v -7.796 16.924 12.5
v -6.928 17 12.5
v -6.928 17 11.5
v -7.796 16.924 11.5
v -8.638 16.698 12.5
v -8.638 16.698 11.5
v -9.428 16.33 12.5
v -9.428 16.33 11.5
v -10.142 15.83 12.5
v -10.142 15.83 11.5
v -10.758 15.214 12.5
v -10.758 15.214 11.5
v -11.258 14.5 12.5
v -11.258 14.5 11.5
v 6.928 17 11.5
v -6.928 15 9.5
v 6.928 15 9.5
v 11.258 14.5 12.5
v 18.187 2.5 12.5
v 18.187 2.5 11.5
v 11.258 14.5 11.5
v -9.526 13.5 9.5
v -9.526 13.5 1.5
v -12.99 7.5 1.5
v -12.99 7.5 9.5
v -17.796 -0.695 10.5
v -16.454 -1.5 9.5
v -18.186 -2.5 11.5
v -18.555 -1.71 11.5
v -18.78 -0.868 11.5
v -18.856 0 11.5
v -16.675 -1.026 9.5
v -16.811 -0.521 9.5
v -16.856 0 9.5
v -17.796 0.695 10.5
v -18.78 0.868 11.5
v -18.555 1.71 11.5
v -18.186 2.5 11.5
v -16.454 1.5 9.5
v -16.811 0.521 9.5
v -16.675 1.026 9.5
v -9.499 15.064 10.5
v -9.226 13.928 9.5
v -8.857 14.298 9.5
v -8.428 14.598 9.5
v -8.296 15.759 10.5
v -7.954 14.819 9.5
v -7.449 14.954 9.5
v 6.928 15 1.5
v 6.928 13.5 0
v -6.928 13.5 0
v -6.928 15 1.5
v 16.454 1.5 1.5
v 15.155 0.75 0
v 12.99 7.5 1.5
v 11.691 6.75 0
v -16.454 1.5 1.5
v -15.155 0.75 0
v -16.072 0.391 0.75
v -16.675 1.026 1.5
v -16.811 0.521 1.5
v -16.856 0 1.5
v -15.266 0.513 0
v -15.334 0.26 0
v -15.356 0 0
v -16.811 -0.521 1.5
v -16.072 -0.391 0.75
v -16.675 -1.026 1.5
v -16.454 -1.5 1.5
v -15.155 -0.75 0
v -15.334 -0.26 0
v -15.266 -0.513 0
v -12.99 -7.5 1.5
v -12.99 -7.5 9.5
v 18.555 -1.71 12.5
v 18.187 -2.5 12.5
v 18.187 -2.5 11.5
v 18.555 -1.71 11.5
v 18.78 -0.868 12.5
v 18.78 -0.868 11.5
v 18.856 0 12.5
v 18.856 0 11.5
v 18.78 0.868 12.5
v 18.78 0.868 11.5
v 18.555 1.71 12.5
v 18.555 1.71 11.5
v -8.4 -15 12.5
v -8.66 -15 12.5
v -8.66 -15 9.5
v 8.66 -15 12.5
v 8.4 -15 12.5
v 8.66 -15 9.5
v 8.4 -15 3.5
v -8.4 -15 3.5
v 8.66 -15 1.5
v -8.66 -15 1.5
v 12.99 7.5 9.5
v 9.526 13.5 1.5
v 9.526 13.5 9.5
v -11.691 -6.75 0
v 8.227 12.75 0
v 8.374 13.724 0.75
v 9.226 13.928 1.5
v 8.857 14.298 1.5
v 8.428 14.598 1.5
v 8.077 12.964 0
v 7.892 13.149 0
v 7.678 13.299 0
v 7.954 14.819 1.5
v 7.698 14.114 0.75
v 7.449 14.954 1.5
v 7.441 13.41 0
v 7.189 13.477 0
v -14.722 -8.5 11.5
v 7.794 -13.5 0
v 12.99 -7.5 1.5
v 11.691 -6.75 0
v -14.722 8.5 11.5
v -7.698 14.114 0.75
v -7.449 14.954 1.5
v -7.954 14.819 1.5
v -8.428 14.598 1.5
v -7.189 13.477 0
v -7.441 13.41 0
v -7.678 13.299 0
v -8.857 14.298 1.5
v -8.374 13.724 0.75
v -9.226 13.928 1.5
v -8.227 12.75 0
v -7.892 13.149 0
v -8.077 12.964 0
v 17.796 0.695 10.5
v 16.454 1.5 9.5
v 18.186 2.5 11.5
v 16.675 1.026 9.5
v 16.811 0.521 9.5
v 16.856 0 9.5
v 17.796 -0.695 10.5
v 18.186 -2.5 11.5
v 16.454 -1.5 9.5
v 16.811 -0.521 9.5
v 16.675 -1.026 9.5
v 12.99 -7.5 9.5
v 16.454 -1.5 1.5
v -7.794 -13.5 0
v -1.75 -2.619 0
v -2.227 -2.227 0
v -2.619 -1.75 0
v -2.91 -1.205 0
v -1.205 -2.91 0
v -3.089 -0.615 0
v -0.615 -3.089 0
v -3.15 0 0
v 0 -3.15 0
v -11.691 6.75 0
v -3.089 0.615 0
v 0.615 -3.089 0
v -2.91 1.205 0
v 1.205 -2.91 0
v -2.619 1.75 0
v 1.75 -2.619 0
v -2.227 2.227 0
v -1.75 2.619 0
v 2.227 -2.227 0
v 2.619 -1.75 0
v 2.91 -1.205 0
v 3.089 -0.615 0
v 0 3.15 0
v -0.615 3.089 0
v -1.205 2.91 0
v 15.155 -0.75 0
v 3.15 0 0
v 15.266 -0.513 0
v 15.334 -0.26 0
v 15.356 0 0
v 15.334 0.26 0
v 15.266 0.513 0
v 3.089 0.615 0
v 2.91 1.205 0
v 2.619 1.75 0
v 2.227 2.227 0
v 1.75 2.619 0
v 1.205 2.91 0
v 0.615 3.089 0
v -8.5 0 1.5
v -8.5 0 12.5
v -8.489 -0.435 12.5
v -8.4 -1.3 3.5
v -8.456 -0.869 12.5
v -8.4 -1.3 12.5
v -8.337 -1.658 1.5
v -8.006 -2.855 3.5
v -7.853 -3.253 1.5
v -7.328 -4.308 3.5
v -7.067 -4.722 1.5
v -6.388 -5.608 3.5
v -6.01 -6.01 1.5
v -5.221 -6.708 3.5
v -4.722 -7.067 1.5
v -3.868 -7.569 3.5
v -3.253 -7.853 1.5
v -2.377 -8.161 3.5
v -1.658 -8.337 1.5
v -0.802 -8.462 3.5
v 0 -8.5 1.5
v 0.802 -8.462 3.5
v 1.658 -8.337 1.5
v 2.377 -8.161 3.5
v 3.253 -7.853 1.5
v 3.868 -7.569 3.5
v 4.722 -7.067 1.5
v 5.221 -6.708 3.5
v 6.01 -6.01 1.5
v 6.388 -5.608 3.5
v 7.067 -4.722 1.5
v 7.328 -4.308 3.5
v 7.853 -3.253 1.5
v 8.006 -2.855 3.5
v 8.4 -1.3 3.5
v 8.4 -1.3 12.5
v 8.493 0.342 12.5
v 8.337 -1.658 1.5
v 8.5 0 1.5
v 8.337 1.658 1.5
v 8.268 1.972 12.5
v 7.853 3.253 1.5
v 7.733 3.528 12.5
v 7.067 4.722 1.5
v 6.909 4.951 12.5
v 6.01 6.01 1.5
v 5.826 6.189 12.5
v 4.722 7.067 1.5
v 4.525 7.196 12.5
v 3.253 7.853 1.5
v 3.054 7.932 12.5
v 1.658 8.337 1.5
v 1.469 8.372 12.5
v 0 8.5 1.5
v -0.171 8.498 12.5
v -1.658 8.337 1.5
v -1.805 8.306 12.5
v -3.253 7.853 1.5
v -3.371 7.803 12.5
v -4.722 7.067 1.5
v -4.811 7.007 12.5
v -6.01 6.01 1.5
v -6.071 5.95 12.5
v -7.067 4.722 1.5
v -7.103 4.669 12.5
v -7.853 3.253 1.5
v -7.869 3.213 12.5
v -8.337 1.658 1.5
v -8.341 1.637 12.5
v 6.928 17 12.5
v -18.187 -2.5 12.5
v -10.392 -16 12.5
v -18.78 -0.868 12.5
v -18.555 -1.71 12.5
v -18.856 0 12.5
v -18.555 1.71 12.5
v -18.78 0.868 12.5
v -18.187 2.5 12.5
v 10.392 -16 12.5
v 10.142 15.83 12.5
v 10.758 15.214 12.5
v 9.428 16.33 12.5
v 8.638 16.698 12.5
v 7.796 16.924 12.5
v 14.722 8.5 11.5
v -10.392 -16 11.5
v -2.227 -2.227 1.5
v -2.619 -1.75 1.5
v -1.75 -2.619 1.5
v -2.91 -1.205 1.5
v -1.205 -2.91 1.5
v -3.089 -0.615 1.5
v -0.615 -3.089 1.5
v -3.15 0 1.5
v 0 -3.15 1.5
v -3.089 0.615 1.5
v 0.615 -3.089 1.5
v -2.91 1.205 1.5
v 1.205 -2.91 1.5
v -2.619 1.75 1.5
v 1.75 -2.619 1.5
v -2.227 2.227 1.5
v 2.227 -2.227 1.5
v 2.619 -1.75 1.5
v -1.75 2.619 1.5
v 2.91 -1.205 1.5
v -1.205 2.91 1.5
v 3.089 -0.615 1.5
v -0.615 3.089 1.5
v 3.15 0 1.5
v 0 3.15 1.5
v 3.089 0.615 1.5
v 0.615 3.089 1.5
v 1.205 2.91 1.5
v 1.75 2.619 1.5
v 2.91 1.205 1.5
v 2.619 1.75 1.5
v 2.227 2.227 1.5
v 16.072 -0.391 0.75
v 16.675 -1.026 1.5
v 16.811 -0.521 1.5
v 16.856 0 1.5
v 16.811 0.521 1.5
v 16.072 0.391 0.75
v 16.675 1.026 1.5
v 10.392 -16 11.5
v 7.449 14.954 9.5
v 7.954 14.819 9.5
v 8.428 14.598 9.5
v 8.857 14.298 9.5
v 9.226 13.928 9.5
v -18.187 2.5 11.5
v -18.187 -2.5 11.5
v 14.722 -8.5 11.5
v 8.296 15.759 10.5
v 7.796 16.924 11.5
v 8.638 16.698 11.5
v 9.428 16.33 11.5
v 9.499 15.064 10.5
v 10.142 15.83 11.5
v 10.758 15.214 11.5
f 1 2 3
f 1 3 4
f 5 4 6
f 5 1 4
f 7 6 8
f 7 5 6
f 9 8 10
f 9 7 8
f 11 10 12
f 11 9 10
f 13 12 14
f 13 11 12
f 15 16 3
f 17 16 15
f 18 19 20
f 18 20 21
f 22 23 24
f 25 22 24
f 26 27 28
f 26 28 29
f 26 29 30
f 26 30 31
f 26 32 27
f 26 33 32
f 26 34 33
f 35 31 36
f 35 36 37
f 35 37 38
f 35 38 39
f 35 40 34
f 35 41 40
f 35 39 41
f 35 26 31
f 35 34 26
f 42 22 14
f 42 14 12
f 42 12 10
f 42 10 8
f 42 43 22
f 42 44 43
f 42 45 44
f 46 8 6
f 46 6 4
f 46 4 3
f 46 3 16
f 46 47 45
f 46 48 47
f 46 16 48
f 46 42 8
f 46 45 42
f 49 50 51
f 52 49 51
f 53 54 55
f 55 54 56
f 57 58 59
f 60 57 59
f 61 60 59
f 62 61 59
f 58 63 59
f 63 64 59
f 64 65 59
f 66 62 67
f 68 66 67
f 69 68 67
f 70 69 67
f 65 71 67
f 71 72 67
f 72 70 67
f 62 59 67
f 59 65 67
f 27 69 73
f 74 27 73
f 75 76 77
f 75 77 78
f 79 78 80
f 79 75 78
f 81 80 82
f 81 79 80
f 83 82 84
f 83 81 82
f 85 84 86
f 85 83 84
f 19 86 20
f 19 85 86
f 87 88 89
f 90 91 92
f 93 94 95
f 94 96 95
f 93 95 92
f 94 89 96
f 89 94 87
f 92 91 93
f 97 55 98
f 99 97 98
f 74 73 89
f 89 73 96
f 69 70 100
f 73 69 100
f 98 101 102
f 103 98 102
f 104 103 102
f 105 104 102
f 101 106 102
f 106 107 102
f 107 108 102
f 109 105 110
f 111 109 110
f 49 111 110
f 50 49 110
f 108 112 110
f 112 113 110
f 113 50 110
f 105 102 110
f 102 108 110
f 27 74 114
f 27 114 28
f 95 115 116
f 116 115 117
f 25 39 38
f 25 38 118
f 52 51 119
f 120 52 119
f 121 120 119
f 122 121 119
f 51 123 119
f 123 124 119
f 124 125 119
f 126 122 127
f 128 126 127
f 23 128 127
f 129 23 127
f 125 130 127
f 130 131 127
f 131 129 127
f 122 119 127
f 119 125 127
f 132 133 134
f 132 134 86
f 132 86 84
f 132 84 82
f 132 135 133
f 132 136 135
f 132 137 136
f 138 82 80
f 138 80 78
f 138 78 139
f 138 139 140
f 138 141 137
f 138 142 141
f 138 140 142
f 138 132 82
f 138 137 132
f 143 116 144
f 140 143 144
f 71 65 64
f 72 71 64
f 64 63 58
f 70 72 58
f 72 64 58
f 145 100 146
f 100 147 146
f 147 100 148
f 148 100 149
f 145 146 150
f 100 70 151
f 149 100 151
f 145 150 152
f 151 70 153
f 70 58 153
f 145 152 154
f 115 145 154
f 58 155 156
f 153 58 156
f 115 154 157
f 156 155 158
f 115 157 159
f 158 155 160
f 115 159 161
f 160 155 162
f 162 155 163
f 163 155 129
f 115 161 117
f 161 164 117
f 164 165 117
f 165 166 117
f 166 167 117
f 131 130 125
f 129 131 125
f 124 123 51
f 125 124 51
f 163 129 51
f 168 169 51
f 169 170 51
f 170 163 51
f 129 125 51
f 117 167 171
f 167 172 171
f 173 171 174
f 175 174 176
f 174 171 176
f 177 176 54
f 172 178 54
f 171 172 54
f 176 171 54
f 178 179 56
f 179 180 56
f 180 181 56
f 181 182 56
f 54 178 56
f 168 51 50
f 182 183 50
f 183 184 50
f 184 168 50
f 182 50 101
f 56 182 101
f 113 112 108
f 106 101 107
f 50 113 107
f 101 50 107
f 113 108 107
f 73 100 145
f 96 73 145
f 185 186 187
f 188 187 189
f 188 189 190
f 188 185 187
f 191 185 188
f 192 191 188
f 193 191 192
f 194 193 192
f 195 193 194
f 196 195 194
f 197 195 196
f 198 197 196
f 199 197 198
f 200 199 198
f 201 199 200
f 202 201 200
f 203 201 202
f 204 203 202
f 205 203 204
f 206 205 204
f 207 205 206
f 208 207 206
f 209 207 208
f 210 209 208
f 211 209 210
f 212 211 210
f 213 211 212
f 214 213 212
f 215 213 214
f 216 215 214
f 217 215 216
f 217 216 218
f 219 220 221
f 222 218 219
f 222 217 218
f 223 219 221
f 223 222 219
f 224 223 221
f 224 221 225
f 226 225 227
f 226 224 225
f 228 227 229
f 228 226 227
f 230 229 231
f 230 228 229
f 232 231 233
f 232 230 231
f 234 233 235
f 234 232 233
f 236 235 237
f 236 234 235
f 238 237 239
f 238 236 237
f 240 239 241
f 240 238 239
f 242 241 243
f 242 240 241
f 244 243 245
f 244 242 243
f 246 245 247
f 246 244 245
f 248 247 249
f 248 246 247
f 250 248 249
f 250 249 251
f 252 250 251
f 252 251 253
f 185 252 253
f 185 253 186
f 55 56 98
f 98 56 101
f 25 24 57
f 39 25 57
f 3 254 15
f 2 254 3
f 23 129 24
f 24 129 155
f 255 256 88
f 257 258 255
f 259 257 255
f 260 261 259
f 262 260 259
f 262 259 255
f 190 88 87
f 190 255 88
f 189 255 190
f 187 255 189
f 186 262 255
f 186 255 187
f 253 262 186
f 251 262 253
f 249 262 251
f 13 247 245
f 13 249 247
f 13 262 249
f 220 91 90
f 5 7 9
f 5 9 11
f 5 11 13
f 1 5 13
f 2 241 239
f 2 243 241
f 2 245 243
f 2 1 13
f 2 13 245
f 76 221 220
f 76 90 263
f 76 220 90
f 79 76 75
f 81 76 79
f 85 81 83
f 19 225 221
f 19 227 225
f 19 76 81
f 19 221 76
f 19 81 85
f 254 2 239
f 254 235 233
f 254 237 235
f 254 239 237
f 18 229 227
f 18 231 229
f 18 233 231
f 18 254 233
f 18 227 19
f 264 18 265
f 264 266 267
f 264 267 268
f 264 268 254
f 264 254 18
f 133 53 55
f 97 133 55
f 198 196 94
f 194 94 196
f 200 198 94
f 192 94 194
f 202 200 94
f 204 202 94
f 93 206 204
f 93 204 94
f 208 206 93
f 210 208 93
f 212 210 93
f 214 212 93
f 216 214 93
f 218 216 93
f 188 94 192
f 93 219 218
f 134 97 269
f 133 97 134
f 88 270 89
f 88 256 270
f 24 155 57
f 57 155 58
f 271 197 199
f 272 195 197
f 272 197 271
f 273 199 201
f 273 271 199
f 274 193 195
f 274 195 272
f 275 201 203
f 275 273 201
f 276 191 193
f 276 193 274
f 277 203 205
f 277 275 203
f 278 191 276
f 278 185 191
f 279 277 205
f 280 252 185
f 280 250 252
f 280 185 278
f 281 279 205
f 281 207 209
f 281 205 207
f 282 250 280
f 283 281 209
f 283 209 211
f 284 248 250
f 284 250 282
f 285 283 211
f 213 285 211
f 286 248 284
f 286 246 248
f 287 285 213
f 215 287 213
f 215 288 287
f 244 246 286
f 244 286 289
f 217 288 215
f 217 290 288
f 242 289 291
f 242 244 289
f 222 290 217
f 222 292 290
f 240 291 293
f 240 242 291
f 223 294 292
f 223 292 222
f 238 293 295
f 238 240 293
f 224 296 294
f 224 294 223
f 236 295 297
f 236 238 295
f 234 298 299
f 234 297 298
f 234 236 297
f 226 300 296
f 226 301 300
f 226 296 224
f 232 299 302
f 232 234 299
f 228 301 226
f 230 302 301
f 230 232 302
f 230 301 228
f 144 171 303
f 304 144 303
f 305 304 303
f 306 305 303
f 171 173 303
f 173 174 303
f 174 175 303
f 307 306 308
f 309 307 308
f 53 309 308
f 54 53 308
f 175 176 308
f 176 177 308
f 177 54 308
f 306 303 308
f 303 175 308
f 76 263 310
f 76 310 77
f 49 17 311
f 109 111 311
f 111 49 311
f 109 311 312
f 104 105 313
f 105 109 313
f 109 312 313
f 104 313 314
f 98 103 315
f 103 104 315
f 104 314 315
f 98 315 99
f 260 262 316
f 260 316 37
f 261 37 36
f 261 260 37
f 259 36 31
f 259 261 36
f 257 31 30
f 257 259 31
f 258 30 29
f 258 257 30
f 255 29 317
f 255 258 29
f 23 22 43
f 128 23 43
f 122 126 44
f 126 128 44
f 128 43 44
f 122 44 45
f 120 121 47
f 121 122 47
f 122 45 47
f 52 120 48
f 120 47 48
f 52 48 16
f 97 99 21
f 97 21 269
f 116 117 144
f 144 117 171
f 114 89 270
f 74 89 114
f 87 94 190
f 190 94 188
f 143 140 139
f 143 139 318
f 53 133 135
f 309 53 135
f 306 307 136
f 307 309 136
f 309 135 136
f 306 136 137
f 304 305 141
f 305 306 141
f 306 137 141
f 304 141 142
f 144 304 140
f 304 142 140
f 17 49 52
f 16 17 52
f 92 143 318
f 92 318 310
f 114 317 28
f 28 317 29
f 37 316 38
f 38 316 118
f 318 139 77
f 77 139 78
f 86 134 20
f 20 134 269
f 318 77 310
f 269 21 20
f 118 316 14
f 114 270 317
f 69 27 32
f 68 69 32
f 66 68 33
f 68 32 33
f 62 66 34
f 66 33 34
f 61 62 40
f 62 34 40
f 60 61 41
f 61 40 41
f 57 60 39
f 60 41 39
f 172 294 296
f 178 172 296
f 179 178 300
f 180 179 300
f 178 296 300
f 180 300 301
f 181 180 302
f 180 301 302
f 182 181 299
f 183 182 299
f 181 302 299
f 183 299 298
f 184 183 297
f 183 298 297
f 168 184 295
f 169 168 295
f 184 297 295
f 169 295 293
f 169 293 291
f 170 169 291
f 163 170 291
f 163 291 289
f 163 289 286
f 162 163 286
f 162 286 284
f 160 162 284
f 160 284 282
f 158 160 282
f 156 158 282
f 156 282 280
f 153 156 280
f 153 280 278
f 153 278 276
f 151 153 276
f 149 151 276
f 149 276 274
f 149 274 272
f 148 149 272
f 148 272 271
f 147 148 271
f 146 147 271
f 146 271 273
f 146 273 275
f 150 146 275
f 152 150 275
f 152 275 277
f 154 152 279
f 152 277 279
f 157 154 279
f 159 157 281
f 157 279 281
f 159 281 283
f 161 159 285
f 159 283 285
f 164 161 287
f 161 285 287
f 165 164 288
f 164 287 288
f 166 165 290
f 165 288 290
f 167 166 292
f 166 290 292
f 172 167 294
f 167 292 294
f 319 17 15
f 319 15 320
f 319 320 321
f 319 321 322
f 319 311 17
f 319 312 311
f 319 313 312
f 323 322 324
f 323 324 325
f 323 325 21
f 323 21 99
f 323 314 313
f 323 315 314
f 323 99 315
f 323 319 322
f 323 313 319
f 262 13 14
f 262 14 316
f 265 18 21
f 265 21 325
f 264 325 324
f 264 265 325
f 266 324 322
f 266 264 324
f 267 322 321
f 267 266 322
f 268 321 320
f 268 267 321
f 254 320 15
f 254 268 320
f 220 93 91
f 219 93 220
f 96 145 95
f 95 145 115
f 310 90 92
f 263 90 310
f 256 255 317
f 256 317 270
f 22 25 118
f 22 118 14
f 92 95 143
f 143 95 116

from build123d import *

# Parameters (mm, degrees)
SKETCH1_R           = 8.5
BOSS_EXTRUDE1_DEPTH = 1.5
SKETCH1_4_R         = 15
SKETCH1_4_R_2       = 8.5
BOSS_EXTRUDE2_DEPTH = 12.5
CUT_EXTRUDE1_START  = 2
SKETCH2_W           = 16.8
SKETCH2_H           = 15
CUT_EXTRUDE1_DEPTH  = 24.416530054
FILLET1_R           = 3
SKETCH3_R           = 3.15
CUT_EXTRUDE2_DEPTH  = 26.102558411
FILLET3_SIZE        = 1.5
BOSS_EXTRUDE3_DEPTH = 1
CHAMFER1_SIZE       = 2


with BuildPart() as part:
    # Sketch1 → Boss-Extrude1 (new body)
    with BuildSketch(Plane.XY):
        Circle(SKETCH1_R)
    extrude(amount=BOSS_EXTRUDE1_DEPTH)

    # Sketch1<4> → Boss-Extrude2 (add)
    # profile 1 of 7: a face of its own
    with BuildSketch(Plane.XY):
        Circle(SKETCH1_4_R)
        with Locations(Location((0, 0, 0), (0, 0, 180))):
            Circle(SKETCH1_4_R_2, mode=Mode.SUBTRACT)
    # profile 2 of 7: a face of its own
    with BuildSketch(Plane.XY):
        with BuildLine():
            Line((12.990381063, 7.499999988), (8.660254038, 15))
            Line((8.660254038, 15), (-1.6e-08, 15))
            ThreePointArc((-1.6e-08, 15), (7.499999999, 12.990381058), (12.990381063, 7.499999988))
        make_face()
    # profile 3 of 7: a face of its own
    with BuildSketch(Plane.XY):
        with BuildLine():
            ThreePointArc((-12.99038099, 7.500000116), (-7.499999949, 12.990381086), (-1.6e-08, 15))
            Line((-1.6e-08, 15), (-8.660254038, 15))
            Line((-8.660254038, 15), (-12.99038099, 7.500000116))
        make_face()
    # profile 4 of 7: a face of its own
    with BuildSketch(Plane.XY):
        with BuildLine():
            ThreePointArc((-12.990380876, -7.500000313), (-15, -1.14e-07), (-12.99038099, 7.500000116))
            Line((-12.99038099, 7.500000116), (-17.320508076, 0))
            Line((-17.320508076, 0), (-12.990380876, -7.500000313))
        make_face()
    # profile 5 of 7: a face of its own
    with BuildSketch(Plane.XY):
        with BuildLine():
            Line((17.320508076, 0), (12.990381063, 7.499999988))
            ThreePointArc((12.990381063, 7.499999988), (14.488887396, 3.88228567), (15, 0))
            ThreePointArc((15, 0), (14.488887391, -3.88228569), (12.990381043, -7.500000024))
            Line((12.990381043, -7.500000024), (17.320508076, 0))
        make_face()
    # profile 6 of 7: a face of its own
    with BuildSketch(Plane.XY):
        with BuildLine():
            Line((8.660254038, -15), (12.990381043, -7.500000024))
            ThreePointArc((12.990381043, -7.500000024), (7.499999988, -12.990381064), (0, -15))
            Line((0, -15), (8.660254038, -15))
        make_face()
    # profile 7 of 7: a face of its own
    with BuildSketch(Plane.XY):
        with BuildLine():
            ThreePointArc((0, -15), (-7.499999843, -12.990381147), (-12.990380876, -7.500000313))
            Line((-12.990380876, -7.500000313), (-8.660254038, -15))
            Line((-8.660254038, -15), (0, -15))
        make_face()
    extrude(amount=BOSS_EXTRUDE2_DEPTH)

    # Sketch2 → Cut-Extrude1 (cut, through all)
    with BuildSketch(Plane.XY.offset(1.5).offset(CUT_EXTRUDE1_START)):
        with Locations((0, -7.5)):
            Rectangle(SKETCH2_W, SKETCH2_H)
    extrude(amount=CUT_EXTRUDE1_DEPTH, mode=Mode.SUBTRACT)

    # Fillet1
    fillet1_edges = [part.edges().sort_by_distance(p)[0] for p in [
        (17.320508076, 0, 6.25),
        (8.660254038, 15, 6.25),
        (-8.660254038, 15, 6.25),
        (-17.320508076, 0, 6.25),
    ]]
    fillet(fillet1_edges, radius=FILLET1_R)

    # Sketch3 → Cut-Extrude2 (cut, through all)
    with BuildSketch(Plane.XY.offset(1.5)):
        Circle(SKETCH3_R)
    extrude(amount=-CUT_EXTRUDE2_DEPTH, mode=Mode.SUBTRACT)

    # Fillet3
    fillet3_edges = [part.edges().sort_by_distance(p)[0] for p in [
        (-12.557368355, -8.25, 0),
        (12.990381057, 7.5, 0),
        (-12.990381057, 7.5, 0),
        (0, 15, 0),
        (16.856406461, 0, 0),
        (8.42820323, 14.598076211, 0),
        (-8.42820323, 14.598076211, 0),
        (-16.856406461, 0, 0),
        (0, -15, 0),
        (12.557368355, -8.25, 0),
    ]]
    chamfer(fillet3_edges, length=FILLET3_SIZE)

    # Sketch5 → Boss-Extrude3 (add)
    with BuildSketch(Plane.XY.offset(12.5)):
        with BuildLine():
            Line((-10.392304845, -16), (-8.660254038, -15))
            Line((-8.660254038, -15), (-16.454482672, -1.5))
            ThreePointArc((-16.454482672, -1.5), (-16.856406461, 0), (-16.454482672, 1.5))
            Line((-16.454482672, 1.5), (-9.526279442, 13.5))
            ThreePointArc((-9.526279442, 13.5), (-8.42820323, 14.598076211), (-6.92820323, 15))
            Line((-6.92820323, 15), (6.92820323, 15))
            ThreePointArc((6.92820323, 15), (8.42820323, 14.598076211), (9.526279442, 13.5))
            Line((9.526279442, 13.5), (16.454482672, 1.5))
            ThreePointArc((16.454482672, 1.5), (16.856406461, 0), (16.454482672, -1.5))
            Line((16.454482672, -1.5), (8.660254038, -15))
            Line((8.660254038, -15), (10.392304845, -16))
            Line((10.392304845, -16), (18.186533479, -2.5))
            ThreePointArc((18.186533479, -2.5), (18.856406461, 0), (18.186533479, 2.5))
            Line((18.186533479, 2.5), (11.258330249, 14.5))
            ThreePointArc((11.258330249, 14.5), (9.42820323, 16.330127019), (6.92820323, 17))
            Line((6.92820323, 17), (-6.92820323, 17))
            ThreePointArc((-6.92820323, 17), (-9.42820323, 16.330127019), (-11.258330249, 14.5))
            Line((-11.258330249, 14.5), (-18.186533479, 2.5))
            ThreePointArc((-18.186533479, 2.5), (-18.856406461, 0), (-18.186533479, -2.5))
            Line((-18.186533479, -2.5), (-10.392304845, -16))
        make_face()
    extrude(amount=-BOSS_EXTRUDE3_DEPTH)

    # Chamfer1
    chamfer1_edges = [part.edges().sort_by_distance(p)[0] for p in [
        (12.557368355, -8.25, 11.5),
        (16.856406461, 0, 11.5),
        (12.990381057, 7.5, 11.5),
        (8.42820323, 14.598076211, 11.5),
        (0, 15, 11.5),
        (-8.42820323, 14.598076211, 11.5),
        (-12.990381057, 7.5, 11.5),
        (-16.856406461, 0, 11.5),
        (-12.557368355, -8.25, 11.5),
    ]]
    chamfer(chamfer1_edges, length=CHAMFER1_SIZE - 0.0001)  # a hair under: the kernel refuses the full size


solid = part.part
